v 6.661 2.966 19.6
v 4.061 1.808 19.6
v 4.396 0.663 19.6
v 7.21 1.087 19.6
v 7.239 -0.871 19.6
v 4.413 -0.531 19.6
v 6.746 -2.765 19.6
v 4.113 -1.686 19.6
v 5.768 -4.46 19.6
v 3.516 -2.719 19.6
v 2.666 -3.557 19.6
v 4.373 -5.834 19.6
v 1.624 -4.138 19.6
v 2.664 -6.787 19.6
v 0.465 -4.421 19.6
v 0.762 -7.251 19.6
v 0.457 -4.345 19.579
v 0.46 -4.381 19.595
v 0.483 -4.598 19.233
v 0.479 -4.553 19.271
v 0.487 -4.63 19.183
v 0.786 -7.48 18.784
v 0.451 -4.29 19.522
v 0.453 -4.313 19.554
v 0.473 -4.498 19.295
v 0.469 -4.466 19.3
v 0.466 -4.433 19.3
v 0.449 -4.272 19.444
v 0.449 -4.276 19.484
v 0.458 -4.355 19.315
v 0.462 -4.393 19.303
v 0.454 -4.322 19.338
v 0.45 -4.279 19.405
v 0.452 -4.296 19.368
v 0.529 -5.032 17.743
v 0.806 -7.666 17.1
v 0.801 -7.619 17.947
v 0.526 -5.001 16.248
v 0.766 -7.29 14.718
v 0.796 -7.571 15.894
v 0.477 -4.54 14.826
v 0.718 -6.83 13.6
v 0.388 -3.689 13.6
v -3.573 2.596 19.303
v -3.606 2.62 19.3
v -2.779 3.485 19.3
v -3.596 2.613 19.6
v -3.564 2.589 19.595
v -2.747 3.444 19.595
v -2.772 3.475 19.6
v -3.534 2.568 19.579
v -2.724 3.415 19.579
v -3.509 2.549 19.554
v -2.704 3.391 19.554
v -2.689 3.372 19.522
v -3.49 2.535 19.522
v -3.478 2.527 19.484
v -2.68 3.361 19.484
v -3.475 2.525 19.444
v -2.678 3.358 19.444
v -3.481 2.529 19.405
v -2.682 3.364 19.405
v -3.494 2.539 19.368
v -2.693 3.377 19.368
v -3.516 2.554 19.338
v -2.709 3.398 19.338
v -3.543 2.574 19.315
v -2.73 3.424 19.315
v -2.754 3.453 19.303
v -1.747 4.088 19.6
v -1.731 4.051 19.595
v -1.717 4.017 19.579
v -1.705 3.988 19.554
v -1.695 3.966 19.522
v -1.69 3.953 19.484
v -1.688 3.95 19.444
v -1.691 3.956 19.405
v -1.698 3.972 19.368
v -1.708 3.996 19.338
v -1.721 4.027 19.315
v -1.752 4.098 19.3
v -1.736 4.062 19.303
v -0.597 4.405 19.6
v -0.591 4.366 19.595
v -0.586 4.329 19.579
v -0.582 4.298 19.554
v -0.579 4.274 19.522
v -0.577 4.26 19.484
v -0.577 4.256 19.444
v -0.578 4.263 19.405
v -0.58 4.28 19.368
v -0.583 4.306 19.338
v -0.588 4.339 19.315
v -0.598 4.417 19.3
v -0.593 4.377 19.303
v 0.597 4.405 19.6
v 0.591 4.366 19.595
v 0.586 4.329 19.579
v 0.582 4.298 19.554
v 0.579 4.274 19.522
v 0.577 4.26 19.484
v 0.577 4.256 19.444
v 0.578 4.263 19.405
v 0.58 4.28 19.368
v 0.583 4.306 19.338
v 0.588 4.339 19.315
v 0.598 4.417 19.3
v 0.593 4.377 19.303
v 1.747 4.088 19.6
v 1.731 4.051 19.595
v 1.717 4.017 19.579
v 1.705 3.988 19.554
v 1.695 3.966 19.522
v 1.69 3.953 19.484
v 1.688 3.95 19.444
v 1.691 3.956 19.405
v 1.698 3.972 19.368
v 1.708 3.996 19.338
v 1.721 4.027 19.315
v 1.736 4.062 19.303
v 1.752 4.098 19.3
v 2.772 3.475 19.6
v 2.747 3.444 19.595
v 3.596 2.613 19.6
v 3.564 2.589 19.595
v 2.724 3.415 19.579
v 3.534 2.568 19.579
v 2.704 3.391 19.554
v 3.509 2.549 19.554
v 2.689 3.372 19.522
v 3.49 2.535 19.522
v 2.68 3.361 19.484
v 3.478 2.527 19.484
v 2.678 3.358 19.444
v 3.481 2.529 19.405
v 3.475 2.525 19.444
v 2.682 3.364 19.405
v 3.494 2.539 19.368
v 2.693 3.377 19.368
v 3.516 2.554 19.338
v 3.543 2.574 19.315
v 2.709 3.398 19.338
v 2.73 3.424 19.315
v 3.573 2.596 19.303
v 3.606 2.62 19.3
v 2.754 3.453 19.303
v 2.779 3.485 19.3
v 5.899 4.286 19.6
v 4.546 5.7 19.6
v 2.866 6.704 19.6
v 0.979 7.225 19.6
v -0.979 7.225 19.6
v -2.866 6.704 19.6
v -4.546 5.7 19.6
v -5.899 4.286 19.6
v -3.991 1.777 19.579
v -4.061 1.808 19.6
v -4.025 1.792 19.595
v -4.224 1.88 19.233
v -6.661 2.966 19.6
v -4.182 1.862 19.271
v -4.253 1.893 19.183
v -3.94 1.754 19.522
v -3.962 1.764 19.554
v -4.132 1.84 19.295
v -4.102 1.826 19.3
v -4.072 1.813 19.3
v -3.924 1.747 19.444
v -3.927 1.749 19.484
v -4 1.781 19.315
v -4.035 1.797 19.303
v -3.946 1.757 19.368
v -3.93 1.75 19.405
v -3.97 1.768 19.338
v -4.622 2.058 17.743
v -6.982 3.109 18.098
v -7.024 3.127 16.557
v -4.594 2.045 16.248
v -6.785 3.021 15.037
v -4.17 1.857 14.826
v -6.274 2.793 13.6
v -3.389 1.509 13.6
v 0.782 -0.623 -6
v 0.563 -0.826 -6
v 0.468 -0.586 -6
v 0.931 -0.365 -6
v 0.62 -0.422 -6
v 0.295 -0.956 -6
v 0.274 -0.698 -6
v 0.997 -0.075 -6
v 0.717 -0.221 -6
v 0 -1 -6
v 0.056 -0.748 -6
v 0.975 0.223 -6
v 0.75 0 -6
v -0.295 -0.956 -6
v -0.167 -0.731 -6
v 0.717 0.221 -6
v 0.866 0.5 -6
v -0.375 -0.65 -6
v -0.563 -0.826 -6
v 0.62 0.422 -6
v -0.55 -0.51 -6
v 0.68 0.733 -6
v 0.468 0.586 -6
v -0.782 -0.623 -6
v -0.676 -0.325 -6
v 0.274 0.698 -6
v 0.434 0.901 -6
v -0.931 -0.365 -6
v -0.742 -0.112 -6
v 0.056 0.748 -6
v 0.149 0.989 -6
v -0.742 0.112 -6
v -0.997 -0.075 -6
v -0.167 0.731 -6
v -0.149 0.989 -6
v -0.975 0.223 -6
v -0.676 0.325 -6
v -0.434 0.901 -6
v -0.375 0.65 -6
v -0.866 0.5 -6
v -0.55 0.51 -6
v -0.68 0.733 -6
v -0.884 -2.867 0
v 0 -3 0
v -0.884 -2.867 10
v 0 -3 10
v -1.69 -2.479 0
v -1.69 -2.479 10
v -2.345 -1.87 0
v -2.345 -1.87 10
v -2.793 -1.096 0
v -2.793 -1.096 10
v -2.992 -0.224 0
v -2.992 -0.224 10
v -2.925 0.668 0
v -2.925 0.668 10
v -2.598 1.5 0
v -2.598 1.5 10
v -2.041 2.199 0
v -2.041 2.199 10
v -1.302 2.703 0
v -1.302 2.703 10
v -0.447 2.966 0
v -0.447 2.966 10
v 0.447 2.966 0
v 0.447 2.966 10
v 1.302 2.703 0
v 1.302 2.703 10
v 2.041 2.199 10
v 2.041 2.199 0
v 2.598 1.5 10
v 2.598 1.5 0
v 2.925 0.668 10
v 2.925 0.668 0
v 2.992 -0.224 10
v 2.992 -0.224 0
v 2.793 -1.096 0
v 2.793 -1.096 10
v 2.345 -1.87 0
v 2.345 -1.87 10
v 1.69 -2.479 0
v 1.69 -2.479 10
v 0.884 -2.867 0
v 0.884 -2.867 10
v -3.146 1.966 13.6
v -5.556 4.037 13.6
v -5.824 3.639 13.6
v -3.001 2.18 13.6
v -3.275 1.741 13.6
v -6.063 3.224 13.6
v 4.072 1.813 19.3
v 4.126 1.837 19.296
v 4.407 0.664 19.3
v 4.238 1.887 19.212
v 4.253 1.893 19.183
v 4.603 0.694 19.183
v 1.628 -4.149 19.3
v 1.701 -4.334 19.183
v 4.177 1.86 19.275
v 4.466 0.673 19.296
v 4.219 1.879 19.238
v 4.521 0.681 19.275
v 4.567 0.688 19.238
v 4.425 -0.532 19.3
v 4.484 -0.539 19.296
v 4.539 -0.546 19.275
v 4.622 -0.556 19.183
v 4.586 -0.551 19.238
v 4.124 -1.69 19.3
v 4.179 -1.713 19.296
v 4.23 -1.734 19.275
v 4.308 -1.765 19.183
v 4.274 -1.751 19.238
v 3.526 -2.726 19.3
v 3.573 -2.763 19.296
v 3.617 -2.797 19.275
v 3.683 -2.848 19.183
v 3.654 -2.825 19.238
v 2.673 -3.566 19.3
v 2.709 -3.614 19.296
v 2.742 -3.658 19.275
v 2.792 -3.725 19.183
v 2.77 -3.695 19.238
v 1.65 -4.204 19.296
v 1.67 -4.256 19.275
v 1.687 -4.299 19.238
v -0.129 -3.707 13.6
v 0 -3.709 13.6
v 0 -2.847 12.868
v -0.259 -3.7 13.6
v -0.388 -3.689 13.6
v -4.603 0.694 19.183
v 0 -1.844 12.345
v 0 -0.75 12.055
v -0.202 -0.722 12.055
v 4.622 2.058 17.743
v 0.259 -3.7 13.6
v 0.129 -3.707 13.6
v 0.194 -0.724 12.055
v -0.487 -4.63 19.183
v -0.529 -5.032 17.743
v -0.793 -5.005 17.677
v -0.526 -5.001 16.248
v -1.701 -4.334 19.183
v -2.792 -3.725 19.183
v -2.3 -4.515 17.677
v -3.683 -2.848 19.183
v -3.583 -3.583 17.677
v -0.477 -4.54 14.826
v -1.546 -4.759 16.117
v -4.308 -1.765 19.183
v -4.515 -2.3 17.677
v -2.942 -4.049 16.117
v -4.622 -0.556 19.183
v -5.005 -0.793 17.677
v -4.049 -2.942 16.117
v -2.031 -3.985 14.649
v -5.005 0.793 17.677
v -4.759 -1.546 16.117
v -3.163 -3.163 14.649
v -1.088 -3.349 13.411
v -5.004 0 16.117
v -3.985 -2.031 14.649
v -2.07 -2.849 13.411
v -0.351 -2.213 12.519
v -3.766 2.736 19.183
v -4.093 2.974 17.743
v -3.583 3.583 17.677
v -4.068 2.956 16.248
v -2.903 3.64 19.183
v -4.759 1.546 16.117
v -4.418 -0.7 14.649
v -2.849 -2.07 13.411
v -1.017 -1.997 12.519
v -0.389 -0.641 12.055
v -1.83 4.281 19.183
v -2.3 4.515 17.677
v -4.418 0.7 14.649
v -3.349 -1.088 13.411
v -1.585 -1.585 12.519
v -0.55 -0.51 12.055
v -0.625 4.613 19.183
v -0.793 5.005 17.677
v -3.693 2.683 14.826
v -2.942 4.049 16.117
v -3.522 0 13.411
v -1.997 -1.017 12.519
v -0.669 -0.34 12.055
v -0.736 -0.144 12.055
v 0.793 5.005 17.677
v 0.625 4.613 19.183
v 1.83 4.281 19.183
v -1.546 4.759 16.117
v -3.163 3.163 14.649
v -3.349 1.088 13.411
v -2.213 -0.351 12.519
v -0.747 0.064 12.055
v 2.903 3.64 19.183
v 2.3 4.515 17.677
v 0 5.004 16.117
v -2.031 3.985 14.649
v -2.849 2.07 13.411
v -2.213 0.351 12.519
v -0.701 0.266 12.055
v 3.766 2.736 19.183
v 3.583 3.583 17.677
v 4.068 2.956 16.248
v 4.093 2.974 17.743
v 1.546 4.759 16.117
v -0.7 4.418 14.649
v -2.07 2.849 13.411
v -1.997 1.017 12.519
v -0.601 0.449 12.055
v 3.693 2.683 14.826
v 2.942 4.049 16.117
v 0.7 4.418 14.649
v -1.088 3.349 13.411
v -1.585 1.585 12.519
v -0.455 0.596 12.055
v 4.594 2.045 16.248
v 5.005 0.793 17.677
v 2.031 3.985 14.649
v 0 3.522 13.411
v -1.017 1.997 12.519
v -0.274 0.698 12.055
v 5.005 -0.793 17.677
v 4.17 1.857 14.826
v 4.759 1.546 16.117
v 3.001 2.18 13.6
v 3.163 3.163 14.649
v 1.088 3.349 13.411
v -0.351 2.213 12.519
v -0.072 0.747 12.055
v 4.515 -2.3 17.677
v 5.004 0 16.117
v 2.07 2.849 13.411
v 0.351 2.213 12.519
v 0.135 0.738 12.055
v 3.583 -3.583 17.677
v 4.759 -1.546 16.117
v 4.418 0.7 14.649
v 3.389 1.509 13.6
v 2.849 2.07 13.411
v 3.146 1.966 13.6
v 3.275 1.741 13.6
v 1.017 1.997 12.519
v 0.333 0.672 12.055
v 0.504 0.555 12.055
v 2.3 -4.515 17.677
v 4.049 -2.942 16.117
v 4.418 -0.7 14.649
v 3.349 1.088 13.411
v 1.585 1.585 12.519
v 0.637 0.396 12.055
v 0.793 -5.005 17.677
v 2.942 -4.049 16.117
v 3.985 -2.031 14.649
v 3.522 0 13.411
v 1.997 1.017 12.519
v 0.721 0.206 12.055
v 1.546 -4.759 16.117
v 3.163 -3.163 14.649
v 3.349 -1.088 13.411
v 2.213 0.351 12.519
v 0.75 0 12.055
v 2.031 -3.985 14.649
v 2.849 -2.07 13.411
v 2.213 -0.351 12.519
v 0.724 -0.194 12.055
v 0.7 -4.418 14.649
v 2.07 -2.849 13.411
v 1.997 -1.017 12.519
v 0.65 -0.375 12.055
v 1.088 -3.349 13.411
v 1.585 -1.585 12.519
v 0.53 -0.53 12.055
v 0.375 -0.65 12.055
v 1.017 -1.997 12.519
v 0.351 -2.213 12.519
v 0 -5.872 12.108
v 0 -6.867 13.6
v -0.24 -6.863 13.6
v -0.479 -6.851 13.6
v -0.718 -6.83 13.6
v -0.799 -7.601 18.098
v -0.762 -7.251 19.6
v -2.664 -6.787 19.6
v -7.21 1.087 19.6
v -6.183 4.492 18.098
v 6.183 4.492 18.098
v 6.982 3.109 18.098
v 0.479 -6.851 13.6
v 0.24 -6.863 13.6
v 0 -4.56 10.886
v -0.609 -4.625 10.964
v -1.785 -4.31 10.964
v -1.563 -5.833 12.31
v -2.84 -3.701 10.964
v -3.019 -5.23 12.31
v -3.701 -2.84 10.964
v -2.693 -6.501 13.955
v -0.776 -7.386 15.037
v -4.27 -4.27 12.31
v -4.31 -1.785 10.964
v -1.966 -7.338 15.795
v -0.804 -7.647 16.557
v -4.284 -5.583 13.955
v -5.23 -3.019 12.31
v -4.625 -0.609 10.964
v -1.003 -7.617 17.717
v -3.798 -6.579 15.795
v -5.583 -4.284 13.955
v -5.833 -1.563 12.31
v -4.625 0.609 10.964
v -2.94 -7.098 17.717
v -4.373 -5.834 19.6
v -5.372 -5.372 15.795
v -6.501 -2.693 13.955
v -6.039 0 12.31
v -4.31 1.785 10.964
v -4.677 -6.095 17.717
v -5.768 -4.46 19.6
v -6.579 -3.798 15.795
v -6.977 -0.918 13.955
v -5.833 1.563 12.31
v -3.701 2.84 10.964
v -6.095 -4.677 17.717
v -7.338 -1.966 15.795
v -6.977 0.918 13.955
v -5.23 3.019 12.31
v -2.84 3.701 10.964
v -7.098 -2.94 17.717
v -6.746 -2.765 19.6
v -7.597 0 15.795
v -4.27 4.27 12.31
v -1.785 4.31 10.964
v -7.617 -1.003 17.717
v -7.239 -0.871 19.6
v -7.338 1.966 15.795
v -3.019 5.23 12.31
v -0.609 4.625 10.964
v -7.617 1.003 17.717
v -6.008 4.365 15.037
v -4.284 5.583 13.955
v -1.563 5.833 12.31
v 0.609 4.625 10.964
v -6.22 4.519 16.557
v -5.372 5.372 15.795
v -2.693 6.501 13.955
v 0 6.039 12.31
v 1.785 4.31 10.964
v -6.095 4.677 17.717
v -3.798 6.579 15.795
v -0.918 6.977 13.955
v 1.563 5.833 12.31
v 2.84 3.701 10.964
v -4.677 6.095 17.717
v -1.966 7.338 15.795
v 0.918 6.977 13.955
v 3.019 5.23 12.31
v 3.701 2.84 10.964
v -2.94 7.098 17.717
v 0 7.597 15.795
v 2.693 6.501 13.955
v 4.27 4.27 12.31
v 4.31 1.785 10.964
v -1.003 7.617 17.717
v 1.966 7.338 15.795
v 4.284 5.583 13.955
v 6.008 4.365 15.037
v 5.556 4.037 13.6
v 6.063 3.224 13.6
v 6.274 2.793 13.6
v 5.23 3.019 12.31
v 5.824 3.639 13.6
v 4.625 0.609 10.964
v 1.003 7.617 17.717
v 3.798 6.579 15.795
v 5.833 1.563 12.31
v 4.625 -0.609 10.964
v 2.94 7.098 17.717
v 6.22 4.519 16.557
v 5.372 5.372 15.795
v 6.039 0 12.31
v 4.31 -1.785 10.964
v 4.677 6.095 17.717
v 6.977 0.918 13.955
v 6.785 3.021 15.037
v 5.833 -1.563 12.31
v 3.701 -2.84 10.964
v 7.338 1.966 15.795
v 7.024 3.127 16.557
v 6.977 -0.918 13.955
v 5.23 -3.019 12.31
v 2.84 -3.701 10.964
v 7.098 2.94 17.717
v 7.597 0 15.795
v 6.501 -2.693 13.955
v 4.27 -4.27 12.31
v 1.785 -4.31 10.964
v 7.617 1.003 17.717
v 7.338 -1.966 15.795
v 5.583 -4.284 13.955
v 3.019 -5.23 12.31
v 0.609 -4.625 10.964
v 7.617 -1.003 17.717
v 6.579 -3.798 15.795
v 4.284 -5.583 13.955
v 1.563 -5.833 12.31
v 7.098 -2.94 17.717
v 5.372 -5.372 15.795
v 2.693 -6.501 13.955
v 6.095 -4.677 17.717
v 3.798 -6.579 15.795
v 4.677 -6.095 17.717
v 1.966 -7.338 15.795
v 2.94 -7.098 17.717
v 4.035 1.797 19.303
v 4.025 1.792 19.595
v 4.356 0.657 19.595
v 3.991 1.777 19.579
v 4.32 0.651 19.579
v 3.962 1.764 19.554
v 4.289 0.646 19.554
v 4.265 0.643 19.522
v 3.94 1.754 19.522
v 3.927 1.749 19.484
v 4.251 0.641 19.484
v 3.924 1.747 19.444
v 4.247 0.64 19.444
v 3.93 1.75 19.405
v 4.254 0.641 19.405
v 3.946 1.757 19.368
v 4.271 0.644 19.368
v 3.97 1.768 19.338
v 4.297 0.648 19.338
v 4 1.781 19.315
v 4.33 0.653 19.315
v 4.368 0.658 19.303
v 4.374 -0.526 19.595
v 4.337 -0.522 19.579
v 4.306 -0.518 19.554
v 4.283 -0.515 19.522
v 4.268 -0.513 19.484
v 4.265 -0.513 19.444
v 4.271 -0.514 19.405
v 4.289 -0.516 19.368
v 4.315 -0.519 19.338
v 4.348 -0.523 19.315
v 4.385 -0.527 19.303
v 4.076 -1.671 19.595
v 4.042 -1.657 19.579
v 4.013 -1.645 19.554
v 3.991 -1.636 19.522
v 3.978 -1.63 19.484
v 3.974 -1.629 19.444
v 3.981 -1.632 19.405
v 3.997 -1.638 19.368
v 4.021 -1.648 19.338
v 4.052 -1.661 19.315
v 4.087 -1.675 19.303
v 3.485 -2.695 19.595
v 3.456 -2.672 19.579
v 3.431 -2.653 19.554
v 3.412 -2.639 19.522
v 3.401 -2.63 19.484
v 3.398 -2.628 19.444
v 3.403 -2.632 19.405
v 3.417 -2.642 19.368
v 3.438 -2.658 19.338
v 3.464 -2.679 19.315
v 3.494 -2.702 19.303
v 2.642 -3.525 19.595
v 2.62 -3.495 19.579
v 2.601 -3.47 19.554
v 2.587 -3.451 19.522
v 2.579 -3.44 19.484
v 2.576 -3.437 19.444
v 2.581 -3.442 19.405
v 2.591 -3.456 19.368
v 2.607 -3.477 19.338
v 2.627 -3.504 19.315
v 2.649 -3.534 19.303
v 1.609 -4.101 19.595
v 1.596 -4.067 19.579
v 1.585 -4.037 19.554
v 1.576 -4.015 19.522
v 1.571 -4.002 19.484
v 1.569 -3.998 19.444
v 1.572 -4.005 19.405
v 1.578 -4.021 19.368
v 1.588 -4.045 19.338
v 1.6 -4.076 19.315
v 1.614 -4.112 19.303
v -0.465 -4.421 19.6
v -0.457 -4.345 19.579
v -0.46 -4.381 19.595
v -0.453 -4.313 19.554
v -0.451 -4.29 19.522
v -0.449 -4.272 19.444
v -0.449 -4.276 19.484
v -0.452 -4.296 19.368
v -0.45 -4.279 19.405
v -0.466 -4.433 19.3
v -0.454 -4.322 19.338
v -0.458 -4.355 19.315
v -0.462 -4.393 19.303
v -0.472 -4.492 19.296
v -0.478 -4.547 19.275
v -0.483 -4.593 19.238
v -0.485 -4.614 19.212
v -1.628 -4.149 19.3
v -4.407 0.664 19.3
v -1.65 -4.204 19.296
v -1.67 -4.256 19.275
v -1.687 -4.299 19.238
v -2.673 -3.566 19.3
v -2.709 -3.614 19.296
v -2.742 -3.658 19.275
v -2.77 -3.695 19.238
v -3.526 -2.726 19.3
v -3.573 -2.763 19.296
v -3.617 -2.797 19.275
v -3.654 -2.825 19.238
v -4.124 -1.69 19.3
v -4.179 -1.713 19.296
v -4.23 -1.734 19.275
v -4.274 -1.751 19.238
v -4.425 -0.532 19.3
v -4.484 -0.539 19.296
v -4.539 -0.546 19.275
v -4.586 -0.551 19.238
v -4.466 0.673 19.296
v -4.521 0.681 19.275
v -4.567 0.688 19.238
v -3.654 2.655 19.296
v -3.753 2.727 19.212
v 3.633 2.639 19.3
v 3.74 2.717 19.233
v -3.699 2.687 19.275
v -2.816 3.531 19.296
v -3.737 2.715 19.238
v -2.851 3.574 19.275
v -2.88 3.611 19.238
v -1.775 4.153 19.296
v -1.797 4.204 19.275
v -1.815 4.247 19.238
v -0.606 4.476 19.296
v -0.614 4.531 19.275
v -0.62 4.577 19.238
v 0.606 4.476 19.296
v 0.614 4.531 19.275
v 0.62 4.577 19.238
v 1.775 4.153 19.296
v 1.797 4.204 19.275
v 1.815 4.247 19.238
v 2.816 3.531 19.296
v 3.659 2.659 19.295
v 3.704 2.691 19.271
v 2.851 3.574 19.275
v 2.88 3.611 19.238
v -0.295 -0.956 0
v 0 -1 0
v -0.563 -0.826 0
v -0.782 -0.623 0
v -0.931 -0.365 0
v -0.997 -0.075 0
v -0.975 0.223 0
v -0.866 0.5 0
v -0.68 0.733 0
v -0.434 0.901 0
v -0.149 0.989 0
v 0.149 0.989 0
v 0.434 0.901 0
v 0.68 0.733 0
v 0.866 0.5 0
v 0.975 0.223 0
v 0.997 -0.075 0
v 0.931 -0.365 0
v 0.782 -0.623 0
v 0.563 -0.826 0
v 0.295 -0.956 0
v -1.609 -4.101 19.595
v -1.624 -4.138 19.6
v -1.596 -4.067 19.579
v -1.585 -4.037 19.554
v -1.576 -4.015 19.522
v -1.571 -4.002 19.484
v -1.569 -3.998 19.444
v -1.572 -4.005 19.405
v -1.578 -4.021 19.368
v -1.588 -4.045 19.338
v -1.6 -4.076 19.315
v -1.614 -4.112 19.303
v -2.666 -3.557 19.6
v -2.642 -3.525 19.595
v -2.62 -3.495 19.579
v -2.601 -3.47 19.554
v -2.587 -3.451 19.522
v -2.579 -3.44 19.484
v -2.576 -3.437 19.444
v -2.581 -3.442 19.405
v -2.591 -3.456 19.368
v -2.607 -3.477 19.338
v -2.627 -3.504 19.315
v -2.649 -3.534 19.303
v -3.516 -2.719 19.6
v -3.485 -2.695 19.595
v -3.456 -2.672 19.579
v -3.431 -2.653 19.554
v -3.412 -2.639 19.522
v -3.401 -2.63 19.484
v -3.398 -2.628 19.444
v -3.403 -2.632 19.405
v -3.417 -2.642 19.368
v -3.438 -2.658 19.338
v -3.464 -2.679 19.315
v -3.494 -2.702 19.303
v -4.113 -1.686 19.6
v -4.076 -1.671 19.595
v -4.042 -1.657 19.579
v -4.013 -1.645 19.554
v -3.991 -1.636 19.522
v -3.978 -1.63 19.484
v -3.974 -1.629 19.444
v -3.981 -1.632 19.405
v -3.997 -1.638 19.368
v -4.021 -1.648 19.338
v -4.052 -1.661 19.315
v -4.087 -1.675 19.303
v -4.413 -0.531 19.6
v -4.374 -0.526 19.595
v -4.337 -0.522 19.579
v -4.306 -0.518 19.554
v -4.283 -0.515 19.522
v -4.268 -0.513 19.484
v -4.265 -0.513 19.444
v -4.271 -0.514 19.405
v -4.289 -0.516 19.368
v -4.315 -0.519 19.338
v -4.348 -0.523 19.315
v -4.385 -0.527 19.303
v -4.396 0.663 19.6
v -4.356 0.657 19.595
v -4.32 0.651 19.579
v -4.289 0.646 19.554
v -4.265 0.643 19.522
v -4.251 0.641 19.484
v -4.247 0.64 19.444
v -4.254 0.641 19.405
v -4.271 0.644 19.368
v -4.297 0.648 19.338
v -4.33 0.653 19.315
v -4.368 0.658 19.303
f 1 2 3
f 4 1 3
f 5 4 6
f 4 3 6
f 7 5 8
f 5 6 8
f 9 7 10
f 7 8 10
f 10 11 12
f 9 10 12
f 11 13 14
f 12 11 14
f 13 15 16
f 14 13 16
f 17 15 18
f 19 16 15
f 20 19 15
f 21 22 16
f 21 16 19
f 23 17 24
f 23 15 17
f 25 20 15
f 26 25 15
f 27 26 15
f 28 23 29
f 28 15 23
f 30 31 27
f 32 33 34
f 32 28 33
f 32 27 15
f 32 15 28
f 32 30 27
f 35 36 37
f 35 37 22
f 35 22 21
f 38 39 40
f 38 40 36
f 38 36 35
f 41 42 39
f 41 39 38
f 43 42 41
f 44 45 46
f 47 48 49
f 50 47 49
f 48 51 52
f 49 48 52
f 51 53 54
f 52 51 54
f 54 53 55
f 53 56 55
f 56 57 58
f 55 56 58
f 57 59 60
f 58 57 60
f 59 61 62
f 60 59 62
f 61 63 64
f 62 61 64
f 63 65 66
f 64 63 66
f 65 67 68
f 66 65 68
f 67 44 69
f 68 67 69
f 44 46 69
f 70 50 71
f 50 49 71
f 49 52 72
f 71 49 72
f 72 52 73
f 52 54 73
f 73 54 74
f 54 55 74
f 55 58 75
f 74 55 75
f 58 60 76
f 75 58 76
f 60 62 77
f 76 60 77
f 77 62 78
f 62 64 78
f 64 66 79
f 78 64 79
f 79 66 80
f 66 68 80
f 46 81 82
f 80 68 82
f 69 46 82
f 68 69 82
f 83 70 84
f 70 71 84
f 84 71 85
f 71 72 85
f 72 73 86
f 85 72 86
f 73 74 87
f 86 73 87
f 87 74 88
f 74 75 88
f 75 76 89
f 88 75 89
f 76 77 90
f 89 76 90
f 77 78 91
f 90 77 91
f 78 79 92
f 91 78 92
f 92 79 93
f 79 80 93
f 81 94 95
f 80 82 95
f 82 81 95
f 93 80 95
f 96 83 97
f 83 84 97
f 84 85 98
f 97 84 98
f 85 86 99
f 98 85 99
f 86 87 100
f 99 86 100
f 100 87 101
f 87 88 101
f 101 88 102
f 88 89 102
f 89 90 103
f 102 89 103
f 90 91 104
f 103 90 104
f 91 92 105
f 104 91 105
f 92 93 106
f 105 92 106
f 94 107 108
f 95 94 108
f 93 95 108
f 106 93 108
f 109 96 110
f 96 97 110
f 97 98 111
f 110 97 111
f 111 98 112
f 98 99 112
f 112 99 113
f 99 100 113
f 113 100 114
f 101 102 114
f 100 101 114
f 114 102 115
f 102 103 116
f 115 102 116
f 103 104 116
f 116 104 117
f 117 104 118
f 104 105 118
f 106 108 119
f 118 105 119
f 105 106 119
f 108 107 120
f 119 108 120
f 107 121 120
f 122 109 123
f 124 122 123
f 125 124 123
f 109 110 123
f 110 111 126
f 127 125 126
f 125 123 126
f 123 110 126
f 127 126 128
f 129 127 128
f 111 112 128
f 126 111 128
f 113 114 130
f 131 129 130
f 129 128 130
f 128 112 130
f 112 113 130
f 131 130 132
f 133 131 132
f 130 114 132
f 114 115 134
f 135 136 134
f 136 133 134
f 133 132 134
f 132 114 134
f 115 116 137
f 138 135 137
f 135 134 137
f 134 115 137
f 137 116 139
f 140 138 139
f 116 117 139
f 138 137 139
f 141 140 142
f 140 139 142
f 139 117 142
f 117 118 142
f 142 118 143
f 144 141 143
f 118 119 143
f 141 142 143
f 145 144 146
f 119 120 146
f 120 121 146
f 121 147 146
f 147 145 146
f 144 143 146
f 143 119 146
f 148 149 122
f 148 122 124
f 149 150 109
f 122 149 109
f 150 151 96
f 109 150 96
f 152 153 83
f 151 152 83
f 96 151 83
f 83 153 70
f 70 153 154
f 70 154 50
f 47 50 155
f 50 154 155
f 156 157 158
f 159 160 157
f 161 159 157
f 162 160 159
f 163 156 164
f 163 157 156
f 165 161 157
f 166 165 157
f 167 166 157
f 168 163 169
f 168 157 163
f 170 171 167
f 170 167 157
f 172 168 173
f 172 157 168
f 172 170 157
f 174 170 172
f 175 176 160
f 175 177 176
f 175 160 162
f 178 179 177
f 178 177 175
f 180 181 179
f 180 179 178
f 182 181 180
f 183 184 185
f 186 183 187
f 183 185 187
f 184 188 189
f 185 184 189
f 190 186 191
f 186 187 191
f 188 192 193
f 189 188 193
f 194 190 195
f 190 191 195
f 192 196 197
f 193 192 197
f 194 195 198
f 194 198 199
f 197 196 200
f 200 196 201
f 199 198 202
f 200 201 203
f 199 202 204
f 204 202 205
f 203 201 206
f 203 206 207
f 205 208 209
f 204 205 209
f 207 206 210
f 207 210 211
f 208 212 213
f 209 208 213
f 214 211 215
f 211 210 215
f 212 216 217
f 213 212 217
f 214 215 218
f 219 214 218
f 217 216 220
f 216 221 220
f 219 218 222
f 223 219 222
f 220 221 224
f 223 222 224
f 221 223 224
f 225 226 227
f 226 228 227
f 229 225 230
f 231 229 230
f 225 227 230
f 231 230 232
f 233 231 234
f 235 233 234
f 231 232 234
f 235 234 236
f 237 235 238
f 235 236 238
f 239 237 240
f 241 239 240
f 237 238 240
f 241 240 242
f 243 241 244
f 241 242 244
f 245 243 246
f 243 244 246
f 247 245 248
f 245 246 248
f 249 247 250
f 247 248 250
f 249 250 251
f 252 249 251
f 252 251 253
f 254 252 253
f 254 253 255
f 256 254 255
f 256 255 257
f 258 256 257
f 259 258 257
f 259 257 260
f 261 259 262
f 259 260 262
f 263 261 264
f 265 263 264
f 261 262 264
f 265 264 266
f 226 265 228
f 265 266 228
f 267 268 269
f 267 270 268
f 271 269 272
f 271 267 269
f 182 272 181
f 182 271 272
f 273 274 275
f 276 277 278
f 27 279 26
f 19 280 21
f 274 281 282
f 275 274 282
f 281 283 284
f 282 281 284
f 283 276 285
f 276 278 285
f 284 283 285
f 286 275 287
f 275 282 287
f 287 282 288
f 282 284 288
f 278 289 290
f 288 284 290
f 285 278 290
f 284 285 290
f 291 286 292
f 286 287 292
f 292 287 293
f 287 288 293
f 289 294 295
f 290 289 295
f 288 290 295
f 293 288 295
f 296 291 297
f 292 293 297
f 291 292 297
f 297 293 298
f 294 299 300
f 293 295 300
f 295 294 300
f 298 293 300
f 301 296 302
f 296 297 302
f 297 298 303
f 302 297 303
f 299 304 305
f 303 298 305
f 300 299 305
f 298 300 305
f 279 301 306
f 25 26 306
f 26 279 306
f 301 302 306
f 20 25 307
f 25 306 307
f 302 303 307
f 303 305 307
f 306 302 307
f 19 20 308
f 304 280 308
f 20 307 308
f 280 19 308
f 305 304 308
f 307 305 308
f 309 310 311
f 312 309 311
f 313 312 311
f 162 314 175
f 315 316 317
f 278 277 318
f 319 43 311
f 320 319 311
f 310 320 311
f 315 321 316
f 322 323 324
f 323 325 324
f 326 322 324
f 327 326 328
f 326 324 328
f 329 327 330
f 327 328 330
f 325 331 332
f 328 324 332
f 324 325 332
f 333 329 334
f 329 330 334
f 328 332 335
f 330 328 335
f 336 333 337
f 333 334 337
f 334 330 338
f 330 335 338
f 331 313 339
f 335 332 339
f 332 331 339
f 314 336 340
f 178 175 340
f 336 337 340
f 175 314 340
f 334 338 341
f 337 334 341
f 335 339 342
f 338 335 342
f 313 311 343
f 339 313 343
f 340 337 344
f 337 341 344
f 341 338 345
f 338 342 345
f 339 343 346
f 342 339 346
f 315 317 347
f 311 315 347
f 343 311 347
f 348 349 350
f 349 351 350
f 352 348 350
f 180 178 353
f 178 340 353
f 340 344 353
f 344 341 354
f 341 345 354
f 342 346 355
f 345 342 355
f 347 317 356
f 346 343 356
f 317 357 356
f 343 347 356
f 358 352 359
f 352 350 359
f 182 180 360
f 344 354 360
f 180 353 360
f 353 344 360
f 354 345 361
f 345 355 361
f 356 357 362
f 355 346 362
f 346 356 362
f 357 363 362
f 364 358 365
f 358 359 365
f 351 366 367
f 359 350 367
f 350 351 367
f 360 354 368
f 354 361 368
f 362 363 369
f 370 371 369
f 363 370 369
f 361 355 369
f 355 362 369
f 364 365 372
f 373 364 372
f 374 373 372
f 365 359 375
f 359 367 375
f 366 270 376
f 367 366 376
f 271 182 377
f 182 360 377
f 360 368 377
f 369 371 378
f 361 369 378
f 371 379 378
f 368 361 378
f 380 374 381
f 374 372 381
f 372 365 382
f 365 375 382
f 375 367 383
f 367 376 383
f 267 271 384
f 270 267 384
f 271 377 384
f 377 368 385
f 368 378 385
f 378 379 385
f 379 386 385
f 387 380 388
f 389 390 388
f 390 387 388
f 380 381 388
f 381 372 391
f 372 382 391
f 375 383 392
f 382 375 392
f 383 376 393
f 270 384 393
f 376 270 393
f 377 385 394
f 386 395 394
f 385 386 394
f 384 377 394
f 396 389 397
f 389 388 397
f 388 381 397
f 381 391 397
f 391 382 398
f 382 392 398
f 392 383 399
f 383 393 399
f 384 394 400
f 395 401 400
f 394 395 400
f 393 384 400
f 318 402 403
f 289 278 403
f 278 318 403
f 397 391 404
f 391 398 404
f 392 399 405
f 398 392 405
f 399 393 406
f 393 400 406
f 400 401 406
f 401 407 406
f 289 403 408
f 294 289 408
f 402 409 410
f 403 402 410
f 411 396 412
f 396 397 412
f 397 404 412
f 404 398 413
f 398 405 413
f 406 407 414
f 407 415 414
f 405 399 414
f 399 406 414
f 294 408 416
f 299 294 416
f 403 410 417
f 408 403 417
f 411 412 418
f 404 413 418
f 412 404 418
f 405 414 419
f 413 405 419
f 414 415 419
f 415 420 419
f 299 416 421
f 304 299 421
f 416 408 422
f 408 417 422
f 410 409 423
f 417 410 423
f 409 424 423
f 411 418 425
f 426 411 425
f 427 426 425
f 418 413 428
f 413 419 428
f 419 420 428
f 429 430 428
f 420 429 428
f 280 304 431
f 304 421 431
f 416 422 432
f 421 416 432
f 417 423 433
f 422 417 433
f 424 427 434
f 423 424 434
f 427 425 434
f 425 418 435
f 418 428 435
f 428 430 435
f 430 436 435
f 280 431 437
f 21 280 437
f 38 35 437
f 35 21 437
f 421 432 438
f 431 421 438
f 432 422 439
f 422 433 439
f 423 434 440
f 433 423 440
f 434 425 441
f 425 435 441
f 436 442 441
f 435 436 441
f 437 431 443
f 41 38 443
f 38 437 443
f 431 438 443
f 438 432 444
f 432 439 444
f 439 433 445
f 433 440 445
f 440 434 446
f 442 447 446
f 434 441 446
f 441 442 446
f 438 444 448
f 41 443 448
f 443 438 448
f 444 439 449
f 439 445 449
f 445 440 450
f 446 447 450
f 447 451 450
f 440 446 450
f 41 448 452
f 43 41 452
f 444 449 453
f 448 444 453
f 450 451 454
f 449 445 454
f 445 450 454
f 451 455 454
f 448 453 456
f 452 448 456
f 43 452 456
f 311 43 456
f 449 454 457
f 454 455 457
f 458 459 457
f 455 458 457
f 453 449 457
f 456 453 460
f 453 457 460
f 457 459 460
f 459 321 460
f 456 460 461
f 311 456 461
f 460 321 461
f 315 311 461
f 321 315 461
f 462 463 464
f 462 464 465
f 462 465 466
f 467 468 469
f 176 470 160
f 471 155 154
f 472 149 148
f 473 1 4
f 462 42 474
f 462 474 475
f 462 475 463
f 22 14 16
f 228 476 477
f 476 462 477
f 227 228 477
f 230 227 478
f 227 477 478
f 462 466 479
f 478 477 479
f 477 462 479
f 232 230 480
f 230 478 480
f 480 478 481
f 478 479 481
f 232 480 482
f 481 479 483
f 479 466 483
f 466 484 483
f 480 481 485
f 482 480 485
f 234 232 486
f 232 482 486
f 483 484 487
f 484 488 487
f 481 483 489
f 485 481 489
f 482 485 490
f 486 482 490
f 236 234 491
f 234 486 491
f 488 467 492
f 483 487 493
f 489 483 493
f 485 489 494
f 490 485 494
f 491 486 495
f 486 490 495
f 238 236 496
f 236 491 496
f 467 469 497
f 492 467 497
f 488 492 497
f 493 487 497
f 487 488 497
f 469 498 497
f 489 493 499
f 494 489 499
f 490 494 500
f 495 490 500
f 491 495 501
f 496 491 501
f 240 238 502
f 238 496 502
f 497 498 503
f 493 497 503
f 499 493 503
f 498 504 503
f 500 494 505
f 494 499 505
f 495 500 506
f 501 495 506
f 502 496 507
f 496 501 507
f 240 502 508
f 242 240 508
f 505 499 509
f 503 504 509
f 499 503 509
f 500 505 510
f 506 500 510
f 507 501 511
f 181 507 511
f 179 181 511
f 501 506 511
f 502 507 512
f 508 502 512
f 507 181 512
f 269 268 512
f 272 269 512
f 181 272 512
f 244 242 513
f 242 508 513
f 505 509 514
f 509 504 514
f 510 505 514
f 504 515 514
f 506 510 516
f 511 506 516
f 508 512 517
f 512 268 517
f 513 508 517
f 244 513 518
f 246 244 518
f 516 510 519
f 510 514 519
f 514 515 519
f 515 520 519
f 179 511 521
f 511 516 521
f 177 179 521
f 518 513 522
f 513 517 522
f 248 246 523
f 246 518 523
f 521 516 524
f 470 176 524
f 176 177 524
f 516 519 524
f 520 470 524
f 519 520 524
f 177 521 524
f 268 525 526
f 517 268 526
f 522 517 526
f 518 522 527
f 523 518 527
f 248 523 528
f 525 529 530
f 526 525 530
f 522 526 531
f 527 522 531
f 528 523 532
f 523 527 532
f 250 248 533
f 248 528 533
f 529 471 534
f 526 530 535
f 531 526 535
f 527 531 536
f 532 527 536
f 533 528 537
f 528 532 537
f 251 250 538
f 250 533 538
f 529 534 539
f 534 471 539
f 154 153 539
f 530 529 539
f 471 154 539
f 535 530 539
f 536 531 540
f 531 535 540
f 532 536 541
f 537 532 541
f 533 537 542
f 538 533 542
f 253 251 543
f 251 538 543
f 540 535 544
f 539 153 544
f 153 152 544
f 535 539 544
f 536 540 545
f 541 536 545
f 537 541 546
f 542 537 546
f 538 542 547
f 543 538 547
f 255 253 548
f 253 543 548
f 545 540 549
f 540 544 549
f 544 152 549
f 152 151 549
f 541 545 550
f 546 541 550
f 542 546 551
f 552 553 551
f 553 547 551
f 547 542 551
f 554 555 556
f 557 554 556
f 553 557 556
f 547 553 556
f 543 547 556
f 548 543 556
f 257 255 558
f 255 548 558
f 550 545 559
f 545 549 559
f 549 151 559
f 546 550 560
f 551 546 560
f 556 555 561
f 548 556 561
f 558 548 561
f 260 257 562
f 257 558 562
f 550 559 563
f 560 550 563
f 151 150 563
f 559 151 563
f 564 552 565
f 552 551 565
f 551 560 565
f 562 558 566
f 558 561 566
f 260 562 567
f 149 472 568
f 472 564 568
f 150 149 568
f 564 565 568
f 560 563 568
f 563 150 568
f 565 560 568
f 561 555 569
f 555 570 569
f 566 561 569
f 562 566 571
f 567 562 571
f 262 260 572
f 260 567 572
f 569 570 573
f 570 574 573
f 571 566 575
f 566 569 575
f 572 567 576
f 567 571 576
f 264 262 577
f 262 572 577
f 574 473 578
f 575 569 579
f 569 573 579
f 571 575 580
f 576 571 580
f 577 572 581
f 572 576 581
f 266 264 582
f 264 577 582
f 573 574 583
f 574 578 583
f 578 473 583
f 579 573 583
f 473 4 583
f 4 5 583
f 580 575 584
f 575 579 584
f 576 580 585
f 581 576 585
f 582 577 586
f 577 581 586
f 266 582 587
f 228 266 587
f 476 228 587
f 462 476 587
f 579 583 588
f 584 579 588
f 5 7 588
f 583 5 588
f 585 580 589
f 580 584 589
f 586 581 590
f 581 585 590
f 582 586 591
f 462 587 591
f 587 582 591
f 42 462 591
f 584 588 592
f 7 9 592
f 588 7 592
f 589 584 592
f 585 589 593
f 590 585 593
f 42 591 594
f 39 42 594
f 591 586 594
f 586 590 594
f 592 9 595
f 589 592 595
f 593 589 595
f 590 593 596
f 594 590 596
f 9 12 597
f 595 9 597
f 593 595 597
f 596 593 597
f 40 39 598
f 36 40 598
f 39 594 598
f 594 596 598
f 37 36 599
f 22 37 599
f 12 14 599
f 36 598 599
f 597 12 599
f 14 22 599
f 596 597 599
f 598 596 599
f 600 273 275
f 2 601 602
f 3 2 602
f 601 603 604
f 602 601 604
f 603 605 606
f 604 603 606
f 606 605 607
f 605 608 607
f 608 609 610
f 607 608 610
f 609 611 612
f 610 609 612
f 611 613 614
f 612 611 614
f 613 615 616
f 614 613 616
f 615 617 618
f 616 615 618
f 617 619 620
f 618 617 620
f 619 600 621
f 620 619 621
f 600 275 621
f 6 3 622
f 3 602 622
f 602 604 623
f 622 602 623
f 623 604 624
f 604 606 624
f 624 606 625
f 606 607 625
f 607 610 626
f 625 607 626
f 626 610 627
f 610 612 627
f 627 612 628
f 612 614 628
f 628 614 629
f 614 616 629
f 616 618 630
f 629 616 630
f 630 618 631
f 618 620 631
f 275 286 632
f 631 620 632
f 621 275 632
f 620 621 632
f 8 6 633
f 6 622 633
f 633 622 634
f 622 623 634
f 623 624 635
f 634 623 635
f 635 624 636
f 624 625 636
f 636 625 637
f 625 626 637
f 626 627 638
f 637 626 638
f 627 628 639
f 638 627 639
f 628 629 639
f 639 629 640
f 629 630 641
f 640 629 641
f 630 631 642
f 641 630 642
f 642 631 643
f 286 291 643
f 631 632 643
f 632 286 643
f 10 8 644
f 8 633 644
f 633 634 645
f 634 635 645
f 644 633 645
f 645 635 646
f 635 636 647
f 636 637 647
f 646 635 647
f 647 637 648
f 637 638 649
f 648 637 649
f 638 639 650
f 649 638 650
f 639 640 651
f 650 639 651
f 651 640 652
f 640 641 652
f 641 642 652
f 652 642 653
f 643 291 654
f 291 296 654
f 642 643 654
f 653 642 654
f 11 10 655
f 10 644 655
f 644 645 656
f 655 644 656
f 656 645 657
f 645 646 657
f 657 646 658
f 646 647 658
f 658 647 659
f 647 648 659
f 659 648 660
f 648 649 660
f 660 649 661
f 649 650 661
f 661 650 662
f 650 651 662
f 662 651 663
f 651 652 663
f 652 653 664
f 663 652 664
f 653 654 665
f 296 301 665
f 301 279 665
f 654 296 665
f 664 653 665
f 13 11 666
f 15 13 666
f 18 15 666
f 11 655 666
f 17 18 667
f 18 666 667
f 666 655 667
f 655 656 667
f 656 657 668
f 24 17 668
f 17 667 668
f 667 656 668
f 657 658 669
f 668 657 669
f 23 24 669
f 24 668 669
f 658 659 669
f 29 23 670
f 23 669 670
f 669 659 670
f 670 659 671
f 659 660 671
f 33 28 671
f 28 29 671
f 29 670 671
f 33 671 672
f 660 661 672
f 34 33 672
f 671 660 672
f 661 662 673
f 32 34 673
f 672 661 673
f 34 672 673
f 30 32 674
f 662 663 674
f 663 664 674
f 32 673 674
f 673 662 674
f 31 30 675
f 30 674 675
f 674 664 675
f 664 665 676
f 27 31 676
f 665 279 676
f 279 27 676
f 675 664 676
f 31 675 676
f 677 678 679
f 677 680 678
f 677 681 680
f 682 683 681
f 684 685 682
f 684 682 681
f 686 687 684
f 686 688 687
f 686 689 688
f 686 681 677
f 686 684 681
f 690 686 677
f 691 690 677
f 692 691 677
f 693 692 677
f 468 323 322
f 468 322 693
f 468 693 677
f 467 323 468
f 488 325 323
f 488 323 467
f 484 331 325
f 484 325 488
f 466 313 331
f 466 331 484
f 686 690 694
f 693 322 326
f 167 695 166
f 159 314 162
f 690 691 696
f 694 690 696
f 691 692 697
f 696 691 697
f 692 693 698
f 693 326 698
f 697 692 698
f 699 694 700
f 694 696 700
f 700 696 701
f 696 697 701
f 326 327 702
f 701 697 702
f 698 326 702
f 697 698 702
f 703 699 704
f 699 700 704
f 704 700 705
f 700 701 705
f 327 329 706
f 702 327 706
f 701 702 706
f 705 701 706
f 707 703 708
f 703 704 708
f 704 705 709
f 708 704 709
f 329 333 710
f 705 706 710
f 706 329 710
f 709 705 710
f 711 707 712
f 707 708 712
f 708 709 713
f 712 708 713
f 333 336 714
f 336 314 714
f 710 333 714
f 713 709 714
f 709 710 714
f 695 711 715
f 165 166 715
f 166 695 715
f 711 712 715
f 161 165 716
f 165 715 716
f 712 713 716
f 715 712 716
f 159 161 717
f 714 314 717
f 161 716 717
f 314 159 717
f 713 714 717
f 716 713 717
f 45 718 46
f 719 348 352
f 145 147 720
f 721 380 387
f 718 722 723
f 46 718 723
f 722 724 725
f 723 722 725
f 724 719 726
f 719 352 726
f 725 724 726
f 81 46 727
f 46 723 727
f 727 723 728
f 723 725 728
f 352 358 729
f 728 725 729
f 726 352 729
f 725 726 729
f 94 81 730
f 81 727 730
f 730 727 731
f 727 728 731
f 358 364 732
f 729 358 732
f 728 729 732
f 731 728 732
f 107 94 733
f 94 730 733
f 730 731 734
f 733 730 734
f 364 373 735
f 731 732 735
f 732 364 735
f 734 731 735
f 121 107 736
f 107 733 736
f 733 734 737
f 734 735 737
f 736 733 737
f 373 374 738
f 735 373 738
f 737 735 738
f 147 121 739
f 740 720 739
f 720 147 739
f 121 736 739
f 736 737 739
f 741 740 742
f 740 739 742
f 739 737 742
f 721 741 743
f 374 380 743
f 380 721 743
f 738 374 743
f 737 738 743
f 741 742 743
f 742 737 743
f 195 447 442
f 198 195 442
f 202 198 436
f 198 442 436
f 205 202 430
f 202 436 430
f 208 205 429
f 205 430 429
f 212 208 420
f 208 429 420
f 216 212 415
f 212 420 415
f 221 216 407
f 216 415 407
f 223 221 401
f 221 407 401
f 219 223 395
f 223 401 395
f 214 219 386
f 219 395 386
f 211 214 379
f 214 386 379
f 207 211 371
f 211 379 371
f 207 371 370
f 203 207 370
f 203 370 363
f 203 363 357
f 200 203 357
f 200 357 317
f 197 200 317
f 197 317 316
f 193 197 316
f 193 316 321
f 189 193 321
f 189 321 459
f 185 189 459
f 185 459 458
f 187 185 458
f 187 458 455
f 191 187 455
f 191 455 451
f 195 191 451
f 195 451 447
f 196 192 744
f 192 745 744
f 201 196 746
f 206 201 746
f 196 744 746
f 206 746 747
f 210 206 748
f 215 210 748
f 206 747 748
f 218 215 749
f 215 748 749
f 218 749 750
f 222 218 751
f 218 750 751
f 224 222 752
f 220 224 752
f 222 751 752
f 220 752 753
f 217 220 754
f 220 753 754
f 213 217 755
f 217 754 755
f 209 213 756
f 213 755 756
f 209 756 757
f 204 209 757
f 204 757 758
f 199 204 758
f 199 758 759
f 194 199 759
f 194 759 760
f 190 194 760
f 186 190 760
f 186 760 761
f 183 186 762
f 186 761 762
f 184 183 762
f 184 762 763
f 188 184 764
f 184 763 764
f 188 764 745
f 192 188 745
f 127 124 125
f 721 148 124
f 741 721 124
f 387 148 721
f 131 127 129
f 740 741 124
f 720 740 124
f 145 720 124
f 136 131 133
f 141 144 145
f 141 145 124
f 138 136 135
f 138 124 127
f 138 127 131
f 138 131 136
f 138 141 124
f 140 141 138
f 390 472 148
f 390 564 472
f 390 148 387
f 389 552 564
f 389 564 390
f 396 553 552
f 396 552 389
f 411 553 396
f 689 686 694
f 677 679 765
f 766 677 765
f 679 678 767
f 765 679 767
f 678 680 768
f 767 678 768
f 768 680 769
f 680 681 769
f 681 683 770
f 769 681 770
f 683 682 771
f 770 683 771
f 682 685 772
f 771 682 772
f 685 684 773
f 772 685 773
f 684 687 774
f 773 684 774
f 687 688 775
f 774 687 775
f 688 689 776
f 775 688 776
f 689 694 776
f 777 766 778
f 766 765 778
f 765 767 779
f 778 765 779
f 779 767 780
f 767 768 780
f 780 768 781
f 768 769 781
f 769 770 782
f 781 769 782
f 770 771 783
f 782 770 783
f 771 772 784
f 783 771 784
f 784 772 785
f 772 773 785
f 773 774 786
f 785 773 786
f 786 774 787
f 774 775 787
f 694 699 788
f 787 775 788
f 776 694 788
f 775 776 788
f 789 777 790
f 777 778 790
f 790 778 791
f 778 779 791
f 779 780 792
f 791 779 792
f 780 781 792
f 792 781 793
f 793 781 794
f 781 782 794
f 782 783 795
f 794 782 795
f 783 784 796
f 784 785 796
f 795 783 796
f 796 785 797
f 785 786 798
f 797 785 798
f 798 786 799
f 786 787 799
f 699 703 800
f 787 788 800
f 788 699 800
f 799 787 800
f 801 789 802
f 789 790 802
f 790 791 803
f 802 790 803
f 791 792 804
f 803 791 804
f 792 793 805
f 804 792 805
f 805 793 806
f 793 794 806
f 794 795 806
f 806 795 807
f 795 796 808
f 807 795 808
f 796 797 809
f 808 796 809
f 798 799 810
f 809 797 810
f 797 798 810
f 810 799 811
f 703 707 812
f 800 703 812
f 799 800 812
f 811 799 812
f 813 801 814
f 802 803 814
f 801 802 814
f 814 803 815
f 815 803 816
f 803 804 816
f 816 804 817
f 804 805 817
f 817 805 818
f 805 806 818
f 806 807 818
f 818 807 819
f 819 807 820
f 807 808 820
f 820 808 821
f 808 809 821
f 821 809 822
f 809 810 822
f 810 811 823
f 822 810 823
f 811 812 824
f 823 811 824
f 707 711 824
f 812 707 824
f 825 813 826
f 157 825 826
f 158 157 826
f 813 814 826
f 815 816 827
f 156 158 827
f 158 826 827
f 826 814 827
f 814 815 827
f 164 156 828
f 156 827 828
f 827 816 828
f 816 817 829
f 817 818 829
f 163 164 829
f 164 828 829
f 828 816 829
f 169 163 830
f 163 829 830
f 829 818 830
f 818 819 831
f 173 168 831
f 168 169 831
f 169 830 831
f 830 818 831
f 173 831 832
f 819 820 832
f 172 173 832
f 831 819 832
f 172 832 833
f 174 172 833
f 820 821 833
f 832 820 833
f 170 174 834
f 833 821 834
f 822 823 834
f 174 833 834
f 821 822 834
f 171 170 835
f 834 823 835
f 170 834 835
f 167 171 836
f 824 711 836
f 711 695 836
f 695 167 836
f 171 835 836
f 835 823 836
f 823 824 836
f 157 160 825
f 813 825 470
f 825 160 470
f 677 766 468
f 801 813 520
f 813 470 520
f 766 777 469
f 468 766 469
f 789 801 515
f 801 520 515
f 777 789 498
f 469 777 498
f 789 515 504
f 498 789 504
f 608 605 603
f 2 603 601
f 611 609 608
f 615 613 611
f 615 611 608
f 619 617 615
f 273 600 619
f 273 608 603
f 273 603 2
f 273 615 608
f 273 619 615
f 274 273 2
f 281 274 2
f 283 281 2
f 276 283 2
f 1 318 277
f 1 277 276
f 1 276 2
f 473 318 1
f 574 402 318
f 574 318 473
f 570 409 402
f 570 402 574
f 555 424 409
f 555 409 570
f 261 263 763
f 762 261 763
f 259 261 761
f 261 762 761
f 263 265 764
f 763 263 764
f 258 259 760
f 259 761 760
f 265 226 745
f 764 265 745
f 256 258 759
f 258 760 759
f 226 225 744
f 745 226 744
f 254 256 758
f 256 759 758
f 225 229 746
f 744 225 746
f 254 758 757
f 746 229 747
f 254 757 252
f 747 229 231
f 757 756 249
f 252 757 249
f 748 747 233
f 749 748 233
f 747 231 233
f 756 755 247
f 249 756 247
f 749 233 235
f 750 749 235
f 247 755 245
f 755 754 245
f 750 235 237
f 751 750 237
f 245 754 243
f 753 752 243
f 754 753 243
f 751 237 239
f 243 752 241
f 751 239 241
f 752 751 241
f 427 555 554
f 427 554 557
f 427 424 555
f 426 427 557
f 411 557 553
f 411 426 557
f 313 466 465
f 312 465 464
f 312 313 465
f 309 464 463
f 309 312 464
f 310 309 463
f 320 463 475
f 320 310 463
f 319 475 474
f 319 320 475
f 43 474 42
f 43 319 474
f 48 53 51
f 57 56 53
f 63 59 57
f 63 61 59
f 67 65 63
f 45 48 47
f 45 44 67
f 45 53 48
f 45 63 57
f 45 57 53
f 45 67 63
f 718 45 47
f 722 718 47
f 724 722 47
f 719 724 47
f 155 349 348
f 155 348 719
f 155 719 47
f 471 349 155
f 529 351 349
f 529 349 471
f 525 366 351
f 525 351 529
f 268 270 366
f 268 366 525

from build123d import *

# Parameters (mm, degrees)
CORTAR_REVOLUCI_N1_START = 13.6
CORTAR_REVOLUCI_N1_DEPTH = 6
MATRIZC1_COUNT           = 3
CROQUIS4_R               = 0.75
CORTAR_EXTRUIR1_DEPTH    = 28.824090282


# Read off the part's stored shape, not the designer's step: Cortar-Revolución1
with BuildPart() as part:
    # Croquis1 → Revolución1 (revolve)
    with BuildSketch(Plane.YZ):
        with BuildLine():
            Line((-3, 0), (-3, 10))
            ThreePointArc((-3, 10), (-7.036805787, 13.954628111), (-7.291090453, 19.6))
            Line((-7.291090453, 19.6), (-4.445222154, 19.6))
            ThreePointArc((-4.445222154, 19.6), (-4.295338521, 19.444092675), (-4.45702764, 19.300465287))
            ThreePointArc((-4.45702764, 19.300465287), (-4.57485069, 19.273071665), (-4.655330258, 19.182762635))
            ThreePointArc((-4.655330258, 19.182762635), (-4.279724841, 14.326202011), (0, 12))
            Line((0, 12), (0, 0))
            Line((0, 0), (0, -6))
            Line((0, -6), (-1, -6))
            Line((-1, -6), (-1, 0))
            Line((-1, 0), (-3, 0))
        make_face()
    revolve(axis=Axis((0, 0, 0), (0, 0, -1)))

    # Cortar-Revolución1 outline → Cortar-Revolución1 (cut)
    with BuildSketch(Plane.XY.offset(CORTAR_REVOLUCI_N1_START)):
        Polygon((0.945938118, -9), (0.805683263, -7.665564198), (0.387742836, -3.689126657), (0.21020847, -2), (-0.21020847, -2), (-0.387742836, -3.689126657), (-0.805683263, -7.665564198), (-0.945938118, -9), align=None)
    cortar_revoluci_n1 = extrude(amount=CORTAR_REVOLUCI_N1_DEPTH, mode=Mode.SUBTRACT)

    # MatrizC1: Cortar-Revolución1 ×3 about axis
    matrizc1_axis = Axis((0, 0, 0), (0, 0, 1))
    for i in range(1, MATRIZC1_COUNT):
        add(cortar_revoluci_n1.rotate(matrizc1_axis, i * 360 / MATRIZC1_COUNT), mode=Mode.SUBTRACT)

    # Croquis4 → Cortar-Extruir1 (cut, through all)
    with BuildSketch(Plane.XY.offset(19.6)):
        Circle(CROQUIS4_R)
    extrude(amount=-CORTAR_EXTRUIR1_DEPTH, mode=Mode.SUBTRACT)


solid = part.part
